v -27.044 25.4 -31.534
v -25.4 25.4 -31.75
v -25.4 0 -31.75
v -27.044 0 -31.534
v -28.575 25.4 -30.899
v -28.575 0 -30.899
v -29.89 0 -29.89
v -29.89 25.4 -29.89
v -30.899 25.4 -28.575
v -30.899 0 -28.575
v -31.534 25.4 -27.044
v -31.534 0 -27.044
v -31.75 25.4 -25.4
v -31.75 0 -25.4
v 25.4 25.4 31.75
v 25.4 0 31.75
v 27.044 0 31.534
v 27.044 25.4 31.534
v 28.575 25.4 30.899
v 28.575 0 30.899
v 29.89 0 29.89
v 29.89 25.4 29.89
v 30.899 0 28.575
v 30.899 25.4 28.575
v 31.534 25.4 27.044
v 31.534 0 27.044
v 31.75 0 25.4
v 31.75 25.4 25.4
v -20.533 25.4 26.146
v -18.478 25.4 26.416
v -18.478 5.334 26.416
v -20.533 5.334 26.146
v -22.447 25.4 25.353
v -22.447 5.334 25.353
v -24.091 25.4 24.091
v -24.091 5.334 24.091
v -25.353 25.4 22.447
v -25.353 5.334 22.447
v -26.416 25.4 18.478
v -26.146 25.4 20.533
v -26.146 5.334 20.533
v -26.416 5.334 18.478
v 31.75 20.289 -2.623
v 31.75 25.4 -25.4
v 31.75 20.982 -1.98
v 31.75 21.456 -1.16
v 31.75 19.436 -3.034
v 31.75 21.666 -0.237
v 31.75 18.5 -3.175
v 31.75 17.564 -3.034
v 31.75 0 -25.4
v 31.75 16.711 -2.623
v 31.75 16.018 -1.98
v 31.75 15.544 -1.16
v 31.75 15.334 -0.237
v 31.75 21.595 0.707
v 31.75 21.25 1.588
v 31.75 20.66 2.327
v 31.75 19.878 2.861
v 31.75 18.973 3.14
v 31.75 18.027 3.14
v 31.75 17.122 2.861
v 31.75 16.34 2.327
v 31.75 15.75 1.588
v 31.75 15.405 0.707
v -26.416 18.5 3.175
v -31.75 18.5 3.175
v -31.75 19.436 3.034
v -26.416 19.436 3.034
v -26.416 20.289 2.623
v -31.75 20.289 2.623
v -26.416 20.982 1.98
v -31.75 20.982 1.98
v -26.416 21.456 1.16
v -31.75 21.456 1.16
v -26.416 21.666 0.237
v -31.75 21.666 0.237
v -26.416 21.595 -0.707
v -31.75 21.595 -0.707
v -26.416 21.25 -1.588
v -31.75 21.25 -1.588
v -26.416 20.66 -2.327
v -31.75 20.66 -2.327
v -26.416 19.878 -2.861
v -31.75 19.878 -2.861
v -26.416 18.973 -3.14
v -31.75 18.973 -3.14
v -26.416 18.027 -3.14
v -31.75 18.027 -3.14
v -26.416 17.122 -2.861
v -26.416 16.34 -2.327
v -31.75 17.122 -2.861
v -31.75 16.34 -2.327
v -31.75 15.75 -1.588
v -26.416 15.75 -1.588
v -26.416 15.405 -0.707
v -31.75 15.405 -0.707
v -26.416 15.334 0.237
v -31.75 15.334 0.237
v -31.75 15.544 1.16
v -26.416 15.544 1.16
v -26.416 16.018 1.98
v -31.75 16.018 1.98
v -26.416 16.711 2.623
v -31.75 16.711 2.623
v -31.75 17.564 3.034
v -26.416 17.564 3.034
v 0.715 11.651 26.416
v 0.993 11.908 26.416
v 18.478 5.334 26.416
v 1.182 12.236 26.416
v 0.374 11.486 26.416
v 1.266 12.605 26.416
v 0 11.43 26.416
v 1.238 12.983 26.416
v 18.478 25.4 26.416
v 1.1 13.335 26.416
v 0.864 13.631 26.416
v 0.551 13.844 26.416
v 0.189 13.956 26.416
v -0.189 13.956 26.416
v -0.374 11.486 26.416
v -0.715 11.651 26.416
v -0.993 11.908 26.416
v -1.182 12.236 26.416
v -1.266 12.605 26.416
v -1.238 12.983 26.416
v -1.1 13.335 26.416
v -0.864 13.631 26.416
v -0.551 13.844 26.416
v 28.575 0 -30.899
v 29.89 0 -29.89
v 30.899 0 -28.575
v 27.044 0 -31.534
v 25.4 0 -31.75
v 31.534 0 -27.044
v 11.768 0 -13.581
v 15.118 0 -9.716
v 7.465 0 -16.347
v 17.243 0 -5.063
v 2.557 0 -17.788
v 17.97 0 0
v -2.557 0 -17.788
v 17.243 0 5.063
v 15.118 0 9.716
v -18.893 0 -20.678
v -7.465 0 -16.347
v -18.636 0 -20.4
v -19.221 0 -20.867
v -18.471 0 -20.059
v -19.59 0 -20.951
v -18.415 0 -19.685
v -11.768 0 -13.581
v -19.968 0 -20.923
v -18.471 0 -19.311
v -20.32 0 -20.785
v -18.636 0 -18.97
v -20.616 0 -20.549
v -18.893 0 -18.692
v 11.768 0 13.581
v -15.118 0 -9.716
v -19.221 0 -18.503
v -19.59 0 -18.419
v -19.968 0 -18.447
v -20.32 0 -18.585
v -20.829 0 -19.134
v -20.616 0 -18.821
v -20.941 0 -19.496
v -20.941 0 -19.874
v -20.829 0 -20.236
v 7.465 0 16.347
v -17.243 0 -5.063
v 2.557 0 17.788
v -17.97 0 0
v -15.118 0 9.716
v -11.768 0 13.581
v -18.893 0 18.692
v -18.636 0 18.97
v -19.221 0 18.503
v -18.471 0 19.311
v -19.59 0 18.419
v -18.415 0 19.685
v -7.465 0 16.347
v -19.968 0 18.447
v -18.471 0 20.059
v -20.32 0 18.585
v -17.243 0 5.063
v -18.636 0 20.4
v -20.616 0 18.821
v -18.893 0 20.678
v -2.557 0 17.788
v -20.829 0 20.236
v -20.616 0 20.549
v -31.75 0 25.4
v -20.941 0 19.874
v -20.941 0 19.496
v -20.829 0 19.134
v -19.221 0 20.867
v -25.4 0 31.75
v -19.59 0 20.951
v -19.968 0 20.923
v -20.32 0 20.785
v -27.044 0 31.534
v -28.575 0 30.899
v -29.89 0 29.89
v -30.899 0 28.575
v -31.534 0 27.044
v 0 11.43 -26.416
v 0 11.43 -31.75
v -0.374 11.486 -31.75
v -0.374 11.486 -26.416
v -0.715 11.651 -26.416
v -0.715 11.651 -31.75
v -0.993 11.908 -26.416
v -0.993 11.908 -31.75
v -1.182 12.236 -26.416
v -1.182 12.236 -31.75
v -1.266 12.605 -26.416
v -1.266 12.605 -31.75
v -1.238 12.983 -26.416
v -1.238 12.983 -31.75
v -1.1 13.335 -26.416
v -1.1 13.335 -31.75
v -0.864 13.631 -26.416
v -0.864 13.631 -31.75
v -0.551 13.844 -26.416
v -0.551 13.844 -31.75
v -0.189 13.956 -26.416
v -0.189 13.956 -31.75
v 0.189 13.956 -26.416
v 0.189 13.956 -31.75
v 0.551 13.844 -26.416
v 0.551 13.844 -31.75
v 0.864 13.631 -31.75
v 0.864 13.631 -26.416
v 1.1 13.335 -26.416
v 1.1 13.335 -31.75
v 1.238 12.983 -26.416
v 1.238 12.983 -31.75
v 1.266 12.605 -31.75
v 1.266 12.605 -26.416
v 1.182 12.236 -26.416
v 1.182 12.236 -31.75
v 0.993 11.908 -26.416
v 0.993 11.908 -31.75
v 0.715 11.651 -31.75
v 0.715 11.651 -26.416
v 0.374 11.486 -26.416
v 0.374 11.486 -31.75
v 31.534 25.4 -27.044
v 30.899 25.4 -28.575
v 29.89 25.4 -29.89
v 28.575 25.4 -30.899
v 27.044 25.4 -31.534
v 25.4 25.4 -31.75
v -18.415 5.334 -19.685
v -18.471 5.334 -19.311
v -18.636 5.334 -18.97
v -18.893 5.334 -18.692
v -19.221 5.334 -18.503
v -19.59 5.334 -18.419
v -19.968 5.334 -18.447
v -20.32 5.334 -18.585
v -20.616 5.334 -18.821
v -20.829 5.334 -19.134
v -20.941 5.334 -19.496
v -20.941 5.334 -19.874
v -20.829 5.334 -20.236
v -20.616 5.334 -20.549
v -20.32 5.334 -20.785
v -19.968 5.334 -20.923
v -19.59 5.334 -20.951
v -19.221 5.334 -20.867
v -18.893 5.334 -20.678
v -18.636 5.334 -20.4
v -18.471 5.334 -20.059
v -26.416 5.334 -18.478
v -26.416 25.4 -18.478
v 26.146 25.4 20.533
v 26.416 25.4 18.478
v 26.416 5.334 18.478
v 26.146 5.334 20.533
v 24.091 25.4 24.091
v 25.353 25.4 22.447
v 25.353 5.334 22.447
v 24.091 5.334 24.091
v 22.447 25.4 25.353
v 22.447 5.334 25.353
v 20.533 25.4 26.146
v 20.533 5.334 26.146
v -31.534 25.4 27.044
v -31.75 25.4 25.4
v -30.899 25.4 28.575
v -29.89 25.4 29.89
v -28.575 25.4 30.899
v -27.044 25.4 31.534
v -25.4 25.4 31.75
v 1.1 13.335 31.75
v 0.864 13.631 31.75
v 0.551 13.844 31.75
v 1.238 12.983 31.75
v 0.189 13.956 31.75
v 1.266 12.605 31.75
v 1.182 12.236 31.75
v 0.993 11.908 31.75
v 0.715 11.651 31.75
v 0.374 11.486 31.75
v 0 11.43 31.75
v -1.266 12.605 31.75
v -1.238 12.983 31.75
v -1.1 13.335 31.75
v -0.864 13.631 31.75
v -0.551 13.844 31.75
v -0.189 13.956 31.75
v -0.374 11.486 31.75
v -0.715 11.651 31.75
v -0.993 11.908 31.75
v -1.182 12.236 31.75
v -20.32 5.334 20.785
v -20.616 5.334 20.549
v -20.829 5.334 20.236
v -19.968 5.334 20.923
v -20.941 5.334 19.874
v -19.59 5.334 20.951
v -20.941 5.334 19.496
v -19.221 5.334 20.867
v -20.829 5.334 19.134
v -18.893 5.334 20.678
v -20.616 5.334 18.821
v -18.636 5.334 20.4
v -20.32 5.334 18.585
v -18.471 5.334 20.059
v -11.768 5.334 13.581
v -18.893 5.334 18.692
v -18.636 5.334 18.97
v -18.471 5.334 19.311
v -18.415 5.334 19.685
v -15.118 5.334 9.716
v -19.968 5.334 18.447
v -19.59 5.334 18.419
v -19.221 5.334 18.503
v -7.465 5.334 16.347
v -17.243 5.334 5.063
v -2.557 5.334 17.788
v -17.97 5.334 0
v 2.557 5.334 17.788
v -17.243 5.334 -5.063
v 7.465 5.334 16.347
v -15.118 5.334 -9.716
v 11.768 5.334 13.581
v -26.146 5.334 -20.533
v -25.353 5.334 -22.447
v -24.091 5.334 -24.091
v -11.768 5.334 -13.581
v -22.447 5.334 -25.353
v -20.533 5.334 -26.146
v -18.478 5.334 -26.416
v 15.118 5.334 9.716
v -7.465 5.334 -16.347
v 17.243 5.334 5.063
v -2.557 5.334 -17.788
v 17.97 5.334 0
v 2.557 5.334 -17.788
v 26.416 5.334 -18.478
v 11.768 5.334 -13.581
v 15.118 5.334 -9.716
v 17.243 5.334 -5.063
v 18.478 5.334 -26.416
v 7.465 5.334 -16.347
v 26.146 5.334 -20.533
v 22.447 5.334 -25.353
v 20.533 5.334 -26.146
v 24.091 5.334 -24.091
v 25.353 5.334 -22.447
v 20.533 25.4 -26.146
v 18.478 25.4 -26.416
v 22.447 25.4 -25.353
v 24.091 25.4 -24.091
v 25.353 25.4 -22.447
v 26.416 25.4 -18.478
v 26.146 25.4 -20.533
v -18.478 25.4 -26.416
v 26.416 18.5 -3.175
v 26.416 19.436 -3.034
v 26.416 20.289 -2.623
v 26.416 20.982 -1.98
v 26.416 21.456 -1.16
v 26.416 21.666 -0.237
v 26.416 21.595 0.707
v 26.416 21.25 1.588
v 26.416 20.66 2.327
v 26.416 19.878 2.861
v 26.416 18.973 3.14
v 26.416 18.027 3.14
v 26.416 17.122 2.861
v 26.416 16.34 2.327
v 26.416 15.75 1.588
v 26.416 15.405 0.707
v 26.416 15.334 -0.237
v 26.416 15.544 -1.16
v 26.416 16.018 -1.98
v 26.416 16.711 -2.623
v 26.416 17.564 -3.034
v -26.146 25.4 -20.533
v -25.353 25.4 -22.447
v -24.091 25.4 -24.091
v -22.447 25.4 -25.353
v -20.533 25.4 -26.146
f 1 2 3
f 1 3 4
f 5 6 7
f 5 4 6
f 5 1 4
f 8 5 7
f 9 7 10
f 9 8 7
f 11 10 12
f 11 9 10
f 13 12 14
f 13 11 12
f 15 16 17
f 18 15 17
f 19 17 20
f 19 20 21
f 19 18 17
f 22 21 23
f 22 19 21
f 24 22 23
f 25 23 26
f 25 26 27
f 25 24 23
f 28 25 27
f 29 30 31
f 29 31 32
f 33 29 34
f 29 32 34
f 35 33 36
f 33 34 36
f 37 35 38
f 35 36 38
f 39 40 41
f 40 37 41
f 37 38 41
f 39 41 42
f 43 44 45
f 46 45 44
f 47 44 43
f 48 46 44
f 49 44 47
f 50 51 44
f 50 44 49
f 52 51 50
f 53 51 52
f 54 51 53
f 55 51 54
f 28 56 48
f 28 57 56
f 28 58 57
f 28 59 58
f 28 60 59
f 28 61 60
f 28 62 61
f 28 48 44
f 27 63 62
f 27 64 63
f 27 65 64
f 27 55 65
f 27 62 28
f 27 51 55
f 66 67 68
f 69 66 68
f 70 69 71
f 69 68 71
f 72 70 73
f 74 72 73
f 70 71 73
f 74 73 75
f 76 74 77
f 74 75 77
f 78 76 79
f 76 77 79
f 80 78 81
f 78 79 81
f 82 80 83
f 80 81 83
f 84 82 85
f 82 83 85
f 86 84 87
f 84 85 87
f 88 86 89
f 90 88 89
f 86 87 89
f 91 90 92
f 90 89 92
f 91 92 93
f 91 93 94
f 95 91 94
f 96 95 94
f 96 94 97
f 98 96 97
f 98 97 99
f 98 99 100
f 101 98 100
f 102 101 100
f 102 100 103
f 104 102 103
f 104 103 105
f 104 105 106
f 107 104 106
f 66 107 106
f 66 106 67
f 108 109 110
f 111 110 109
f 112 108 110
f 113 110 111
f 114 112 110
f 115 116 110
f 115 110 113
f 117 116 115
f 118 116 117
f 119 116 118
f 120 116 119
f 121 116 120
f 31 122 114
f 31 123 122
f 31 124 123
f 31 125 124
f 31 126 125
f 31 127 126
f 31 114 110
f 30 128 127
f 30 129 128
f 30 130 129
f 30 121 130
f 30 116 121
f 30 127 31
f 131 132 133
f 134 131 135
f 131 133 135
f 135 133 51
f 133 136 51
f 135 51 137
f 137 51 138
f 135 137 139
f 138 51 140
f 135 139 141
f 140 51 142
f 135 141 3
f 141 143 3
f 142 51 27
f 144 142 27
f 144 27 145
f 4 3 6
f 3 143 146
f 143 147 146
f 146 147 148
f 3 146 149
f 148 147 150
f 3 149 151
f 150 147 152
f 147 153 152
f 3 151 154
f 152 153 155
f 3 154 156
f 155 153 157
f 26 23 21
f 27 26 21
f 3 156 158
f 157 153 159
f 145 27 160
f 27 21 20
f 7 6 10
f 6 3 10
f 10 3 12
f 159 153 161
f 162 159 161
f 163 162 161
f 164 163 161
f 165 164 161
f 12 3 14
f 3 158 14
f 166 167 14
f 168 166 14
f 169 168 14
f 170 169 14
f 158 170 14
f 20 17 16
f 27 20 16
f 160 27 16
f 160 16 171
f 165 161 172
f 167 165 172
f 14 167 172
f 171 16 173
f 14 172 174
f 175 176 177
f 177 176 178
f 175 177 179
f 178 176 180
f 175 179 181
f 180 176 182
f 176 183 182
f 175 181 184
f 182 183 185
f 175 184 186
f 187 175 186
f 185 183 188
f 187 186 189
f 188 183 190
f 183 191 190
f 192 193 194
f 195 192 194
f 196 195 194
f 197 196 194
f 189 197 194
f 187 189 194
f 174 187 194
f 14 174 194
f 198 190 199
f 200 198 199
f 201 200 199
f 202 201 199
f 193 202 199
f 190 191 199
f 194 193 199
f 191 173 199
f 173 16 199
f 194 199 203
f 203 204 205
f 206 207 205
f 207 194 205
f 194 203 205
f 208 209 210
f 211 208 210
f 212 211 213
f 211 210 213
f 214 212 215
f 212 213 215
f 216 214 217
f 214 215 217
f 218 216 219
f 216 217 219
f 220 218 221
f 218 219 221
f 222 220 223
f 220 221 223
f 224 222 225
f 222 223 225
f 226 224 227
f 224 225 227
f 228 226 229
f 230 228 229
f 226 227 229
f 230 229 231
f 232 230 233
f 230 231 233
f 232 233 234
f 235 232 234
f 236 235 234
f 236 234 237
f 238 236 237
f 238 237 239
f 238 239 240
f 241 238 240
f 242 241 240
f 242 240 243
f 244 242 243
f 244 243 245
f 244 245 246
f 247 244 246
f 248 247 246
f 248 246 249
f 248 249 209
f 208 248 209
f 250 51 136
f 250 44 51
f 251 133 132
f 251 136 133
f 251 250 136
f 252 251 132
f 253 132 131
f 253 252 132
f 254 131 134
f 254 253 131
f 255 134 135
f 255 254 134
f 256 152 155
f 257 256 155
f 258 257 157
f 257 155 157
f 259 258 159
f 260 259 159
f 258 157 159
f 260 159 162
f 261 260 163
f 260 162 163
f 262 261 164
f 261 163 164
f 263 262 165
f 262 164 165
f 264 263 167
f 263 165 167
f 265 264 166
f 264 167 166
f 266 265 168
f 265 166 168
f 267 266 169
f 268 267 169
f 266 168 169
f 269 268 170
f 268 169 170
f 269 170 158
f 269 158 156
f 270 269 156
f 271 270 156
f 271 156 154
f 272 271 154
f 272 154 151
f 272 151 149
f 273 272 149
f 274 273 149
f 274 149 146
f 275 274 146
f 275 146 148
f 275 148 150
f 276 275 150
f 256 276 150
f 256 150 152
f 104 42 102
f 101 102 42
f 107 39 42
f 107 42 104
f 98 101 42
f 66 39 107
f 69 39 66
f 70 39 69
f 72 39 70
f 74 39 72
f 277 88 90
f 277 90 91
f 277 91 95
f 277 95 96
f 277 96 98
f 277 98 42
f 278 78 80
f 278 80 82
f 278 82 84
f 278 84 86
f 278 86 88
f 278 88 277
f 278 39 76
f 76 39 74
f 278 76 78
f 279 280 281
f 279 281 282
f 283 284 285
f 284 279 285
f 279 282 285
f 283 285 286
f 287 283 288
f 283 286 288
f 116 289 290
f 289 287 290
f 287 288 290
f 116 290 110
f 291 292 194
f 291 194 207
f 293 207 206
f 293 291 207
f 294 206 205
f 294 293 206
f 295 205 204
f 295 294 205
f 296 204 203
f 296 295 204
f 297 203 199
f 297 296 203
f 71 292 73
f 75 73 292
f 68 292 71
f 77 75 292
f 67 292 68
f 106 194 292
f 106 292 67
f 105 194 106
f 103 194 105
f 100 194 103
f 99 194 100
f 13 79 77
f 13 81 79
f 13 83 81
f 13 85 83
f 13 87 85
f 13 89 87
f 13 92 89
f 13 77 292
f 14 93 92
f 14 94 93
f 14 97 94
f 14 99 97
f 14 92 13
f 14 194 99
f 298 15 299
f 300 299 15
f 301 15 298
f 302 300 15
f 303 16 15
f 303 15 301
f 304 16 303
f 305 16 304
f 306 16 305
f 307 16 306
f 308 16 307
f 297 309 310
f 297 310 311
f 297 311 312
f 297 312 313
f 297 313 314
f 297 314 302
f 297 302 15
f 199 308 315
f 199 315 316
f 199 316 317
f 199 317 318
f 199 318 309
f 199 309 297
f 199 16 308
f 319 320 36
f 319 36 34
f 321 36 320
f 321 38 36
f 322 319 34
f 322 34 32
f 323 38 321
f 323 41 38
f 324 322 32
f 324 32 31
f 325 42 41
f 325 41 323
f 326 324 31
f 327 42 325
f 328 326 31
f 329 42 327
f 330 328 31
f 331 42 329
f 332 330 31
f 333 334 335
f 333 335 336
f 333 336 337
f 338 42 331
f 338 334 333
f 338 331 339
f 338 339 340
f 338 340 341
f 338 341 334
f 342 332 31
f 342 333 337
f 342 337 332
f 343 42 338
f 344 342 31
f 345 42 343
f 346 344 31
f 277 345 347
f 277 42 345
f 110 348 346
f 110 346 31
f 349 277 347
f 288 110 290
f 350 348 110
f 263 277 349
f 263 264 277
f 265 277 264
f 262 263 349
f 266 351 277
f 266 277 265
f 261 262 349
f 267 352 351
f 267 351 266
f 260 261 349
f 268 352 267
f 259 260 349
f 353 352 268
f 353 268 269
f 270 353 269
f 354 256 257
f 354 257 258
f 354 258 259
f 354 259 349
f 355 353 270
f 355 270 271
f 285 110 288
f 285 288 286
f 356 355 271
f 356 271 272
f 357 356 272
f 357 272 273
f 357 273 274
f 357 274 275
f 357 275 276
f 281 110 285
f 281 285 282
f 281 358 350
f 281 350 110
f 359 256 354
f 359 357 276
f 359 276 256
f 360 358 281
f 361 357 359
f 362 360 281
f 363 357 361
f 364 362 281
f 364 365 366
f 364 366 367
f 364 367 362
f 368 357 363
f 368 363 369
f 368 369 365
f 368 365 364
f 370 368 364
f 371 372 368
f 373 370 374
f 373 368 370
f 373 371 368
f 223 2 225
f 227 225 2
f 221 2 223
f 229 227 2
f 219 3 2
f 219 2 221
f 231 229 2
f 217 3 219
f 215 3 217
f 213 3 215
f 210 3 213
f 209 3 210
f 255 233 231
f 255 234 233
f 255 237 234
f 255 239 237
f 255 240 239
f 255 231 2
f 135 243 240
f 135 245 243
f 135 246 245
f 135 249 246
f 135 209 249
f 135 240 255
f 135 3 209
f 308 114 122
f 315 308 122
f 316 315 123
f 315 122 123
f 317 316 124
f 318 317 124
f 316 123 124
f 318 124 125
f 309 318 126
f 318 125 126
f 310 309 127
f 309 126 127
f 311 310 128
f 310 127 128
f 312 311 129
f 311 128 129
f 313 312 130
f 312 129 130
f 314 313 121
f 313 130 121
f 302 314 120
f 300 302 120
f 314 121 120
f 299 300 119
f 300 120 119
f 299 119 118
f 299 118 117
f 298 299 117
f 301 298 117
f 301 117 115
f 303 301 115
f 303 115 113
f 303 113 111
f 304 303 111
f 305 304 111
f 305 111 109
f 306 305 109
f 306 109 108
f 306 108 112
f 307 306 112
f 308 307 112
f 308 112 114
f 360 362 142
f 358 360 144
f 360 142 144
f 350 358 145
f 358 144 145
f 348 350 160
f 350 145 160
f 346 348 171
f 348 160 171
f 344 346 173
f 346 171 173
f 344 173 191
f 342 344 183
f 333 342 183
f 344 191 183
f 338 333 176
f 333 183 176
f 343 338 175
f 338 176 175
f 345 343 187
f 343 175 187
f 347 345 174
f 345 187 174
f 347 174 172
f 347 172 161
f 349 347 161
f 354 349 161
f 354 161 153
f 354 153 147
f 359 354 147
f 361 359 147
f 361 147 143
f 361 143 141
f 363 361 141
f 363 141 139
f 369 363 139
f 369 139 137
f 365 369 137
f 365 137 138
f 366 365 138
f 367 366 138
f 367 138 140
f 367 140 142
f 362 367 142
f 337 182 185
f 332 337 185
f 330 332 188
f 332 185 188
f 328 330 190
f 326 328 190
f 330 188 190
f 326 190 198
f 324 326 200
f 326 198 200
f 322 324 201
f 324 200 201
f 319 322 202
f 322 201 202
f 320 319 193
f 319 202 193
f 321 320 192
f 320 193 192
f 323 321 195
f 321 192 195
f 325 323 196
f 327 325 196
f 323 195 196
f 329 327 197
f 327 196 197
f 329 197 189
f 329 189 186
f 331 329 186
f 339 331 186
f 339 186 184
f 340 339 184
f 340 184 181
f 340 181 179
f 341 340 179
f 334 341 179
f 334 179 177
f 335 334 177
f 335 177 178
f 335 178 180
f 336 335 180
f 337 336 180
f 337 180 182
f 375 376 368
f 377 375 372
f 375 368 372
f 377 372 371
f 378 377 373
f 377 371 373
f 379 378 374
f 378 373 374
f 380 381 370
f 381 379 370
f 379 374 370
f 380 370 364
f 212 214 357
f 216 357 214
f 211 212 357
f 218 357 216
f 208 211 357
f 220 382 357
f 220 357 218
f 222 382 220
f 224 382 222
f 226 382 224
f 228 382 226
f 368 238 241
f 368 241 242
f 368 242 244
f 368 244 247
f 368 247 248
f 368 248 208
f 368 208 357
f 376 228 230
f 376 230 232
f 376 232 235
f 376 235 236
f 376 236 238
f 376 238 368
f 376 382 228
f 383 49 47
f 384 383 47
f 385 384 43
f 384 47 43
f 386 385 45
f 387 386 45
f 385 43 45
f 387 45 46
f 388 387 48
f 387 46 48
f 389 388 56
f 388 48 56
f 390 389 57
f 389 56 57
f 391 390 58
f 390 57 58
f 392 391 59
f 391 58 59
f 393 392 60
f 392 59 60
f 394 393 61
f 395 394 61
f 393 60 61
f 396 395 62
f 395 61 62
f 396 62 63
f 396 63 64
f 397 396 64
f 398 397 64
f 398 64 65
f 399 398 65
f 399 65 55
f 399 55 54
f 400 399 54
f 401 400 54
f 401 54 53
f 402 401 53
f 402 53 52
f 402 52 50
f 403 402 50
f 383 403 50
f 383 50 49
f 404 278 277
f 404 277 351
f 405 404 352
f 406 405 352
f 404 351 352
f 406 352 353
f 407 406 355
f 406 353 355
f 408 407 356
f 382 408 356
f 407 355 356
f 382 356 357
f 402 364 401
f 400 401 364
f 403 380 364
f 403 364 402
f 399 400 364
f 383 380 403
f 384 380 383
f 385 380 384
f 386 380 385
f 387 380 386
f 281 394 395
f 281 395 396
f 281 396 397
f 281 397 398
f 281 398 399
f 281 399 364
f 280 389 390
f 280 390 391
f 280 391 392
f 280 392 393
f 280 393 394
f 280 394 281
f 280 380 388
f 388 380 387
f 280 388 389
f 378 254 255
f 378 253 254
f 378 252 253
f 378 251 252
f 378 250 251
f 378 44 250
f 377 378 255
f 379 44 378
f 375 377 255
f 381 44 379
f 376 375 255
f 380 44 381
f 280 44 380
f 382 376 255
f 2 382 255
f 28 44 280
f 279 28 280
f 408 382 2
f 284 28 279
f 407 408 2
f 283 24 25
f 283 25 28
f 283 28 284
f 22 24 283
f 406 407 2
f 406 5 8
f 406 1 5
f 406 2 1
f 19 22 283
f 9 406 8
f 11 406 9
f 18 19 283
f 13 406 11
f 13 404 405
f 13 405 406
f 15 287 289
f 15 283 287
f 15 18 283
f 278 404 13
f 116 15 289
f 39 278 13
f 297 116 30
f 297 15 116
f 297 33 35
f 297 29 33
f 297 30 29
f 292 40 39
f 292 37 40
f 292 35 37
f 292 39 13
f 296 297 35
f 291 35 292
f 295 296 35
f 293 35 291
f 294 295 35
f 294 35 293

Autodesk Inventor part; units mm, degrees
ref_plane "YZ Plane" through (0, 0, 0) normal (1, 0, 0) x (0, 1, 0)
ref_plane "XZ Plane" through (0, 0, 0) normal (0, 1, 0) x (-1, 0, 0)
sketch "Sketch2" plane through (0, 0, 0) normal (0, 1, 0) x (-1, 0, 0)
  line L0 (-31.75, 31.75) -> (31.75, 31.75)
  line L1 (31.75, 31.75) -> (31.75, -31.75)
  line L2 (31.75, -31.75) -> (-31.75, -31.75)
  line L3 (-31.75, -31.75) -> (-31.75, 31.75)
  line L4 (-31.75, 31.75) -> (31.75, -31.75) construction
  line L5 (31.75, 31.75) -> (-31.75, -31.75) construction
  point P0 (0, 0)
  dimension "d3" = 63.5
  dimension "d4" = 63.5
extrude "Extrusion2" add sketch "Sketch2" along normal blind 25.4
fillet "Fillet1" radius 6.35 4 edges at (31.75, 12.7, 31.75) (31.75, 12.7, -31.75) (-31.75, 12.7, -31.75) (-31.75, 12.7, 31.75)
sketch "Sketch3" plane through (0, 25.4, 0) normal (0, 1, 0) x (1, 0, 0)
  arc A0 (-31.75, -25.4) -> (-25.4, -31.75) centre (-25.4, -25.4) ccw projected
  line L0 (-25.4, -31.75) -> (25.4, -31.75) projected
  arc A1 (25.4, -31.75) -> (31.75, -25.4) centre (25.4, -25.4) ccw projected
  line L1 (31.75, -25.4) -> (31.75, 25.4) projected
  arc A2 (31.75, 25.4) -> (25.4, 31.75) centre (25.4, 25.4) ccw projected
  line L2 (25.4, 31.75) -> (-25.4, 31.75) projected
  arc A3 (-25.4, 31.75) -> (-31.75, 25.4) centre (-25.4, 25.4) ccw projected
  line L3 (-31.75, 25.4) -> (-31.75, -25.4) projected
  line L4 (-26.416, 26.416) -> (26.416, 26.416)
  line L5 (26.416, 26.416) -> (26.416, -26.416)
  line L6 (26.416, -26.416) -> (-26.416, -26.416)
  line L7 (-26.416, -26.416) -> (-26.416, 26.416)
  point P0 (0, 0)
  dimension "d8" = 5.334
extrude "Extrusion3" cut sketch "Sketch3" against normal blind 20.066 contours L4 L5 L6 L7
ref_plane "Work Plane1" through (0, 25.4, -26.416) normal (-1, 0, 0) x (0, 0, 1)
fillet "Fillet2" radius 7.9375 4 edges at (-26.416, 15.367, 26.416) (-26.416, 15.367, -26.416) (26.416, 15.367, -26.416) (26.416, 15.367, 26.416)
sketch "Sketch6" plane through (-25.4, 0, 31.75) normal (0, 0, 1) x (1, 0, 0)
  line L0 (0, 0) -> (0, 25.4) projected
  line L1 (50.8, 0) -> (0, 0) projected
  line L2 (50.8, 25.4) -> (50.8, 0) projected
  line L3 (0, 25.4) -> (50.8, 25.4) projected
  circle A0 centre (25.4, 12.7) radius 1.27
  point P0 (25.4, 0)
  dimension "d31" = 2.54
  dimension "d32" = 12.7
  dimension "d33" = 25.4
hole "Hole3" at (0, 12.7, 31.75) direction (0, 0, -1) diameter 2.54 depth 76.2 tip angle 118
sketch "Sketch8" plane through (0, 0, 0) normal (0, -1, 0) x (1, 0, 0)
  point P0 (0, 0)
sketch "Sketch9" plane through (0, 0, 0) normal (0, -1, 0) x (1, 0, 0)
  line L0 (25.4, 28.575) -> (-15.875, 28.575)
  arc A0 (-15.875, 28.575) -> (-28.575, 15.875) centre (-15.875, 15.875) ccw
  line L1 (-28.575, 15.875) -> (-28.575, -15.875)
  arc A1 (-28.575, -15.875) -> (-15.875, -28.575) centre (-15.875, -15.875) ccw
  line L2 (-15.875, -28.575) -> (25.4, -28.575)
  arc A2 (25.4, -28.575) -> (28.575, -25.4) centre (25.4, -25.4) ccw
  line L3 (28.575, -25.4) -> (28.575, -1.27)
  line L4 (28.575, -1.27) -> (17.9256, -1.27)
  circle A3 centre (0, 0) radius 17.9705
  line L5 (17.9256, 1.27) -> (28.575, 1.27)
  line L6 (28.575, 1.27) -> (28.575, 25.4)
  arc A4 (28.575, 25.4) -> (25.4, 28.575) centre (25.4, 25.4) ccw
  circle A5 centre (-19.685, -19.685) radius 1.27
  circle A6 centre (-19.685, 19.685) radius 1.27
  dimension "d53" = 2.54
  dimension "d54" = 3.81
  dimension "d55" = 3.81
  dimension "d56" = 2.54
  dimension "d57" = 3.81
  dimension "d58" = 3.81
extrude "Extrusion6" cut sketch "Sketch9" against normal blind 25.4 contours A3 | A5 | A6
sketch "Sketch10" plane through (31.75, 0, 25.4) normal (1, 0, 0) x (0, 0, -1)
  circle A0 centre (25.4, 18.5) radius 3.175
  point P0 (25.4, 0)
  dimension "d61" = 6.35
extrude "Extrusion7" cut sketch "Sketch10" against normal blind 6.35
sketch "Sketch11" plane through (-31.75, 0, -25.4) normal (-1, 0, 0) x (0, 0, 1)
  circle A0 centre (25.4, 18.5) radius 3.175 projected
  circle A1 centre (25.4, 18.5) radius 3.175 projected
  point P0 (25.4, 0)
extrude "Extrusion8" cut sketch "Sketch11" against normal blind 25.4
properties part number "basemotor"
